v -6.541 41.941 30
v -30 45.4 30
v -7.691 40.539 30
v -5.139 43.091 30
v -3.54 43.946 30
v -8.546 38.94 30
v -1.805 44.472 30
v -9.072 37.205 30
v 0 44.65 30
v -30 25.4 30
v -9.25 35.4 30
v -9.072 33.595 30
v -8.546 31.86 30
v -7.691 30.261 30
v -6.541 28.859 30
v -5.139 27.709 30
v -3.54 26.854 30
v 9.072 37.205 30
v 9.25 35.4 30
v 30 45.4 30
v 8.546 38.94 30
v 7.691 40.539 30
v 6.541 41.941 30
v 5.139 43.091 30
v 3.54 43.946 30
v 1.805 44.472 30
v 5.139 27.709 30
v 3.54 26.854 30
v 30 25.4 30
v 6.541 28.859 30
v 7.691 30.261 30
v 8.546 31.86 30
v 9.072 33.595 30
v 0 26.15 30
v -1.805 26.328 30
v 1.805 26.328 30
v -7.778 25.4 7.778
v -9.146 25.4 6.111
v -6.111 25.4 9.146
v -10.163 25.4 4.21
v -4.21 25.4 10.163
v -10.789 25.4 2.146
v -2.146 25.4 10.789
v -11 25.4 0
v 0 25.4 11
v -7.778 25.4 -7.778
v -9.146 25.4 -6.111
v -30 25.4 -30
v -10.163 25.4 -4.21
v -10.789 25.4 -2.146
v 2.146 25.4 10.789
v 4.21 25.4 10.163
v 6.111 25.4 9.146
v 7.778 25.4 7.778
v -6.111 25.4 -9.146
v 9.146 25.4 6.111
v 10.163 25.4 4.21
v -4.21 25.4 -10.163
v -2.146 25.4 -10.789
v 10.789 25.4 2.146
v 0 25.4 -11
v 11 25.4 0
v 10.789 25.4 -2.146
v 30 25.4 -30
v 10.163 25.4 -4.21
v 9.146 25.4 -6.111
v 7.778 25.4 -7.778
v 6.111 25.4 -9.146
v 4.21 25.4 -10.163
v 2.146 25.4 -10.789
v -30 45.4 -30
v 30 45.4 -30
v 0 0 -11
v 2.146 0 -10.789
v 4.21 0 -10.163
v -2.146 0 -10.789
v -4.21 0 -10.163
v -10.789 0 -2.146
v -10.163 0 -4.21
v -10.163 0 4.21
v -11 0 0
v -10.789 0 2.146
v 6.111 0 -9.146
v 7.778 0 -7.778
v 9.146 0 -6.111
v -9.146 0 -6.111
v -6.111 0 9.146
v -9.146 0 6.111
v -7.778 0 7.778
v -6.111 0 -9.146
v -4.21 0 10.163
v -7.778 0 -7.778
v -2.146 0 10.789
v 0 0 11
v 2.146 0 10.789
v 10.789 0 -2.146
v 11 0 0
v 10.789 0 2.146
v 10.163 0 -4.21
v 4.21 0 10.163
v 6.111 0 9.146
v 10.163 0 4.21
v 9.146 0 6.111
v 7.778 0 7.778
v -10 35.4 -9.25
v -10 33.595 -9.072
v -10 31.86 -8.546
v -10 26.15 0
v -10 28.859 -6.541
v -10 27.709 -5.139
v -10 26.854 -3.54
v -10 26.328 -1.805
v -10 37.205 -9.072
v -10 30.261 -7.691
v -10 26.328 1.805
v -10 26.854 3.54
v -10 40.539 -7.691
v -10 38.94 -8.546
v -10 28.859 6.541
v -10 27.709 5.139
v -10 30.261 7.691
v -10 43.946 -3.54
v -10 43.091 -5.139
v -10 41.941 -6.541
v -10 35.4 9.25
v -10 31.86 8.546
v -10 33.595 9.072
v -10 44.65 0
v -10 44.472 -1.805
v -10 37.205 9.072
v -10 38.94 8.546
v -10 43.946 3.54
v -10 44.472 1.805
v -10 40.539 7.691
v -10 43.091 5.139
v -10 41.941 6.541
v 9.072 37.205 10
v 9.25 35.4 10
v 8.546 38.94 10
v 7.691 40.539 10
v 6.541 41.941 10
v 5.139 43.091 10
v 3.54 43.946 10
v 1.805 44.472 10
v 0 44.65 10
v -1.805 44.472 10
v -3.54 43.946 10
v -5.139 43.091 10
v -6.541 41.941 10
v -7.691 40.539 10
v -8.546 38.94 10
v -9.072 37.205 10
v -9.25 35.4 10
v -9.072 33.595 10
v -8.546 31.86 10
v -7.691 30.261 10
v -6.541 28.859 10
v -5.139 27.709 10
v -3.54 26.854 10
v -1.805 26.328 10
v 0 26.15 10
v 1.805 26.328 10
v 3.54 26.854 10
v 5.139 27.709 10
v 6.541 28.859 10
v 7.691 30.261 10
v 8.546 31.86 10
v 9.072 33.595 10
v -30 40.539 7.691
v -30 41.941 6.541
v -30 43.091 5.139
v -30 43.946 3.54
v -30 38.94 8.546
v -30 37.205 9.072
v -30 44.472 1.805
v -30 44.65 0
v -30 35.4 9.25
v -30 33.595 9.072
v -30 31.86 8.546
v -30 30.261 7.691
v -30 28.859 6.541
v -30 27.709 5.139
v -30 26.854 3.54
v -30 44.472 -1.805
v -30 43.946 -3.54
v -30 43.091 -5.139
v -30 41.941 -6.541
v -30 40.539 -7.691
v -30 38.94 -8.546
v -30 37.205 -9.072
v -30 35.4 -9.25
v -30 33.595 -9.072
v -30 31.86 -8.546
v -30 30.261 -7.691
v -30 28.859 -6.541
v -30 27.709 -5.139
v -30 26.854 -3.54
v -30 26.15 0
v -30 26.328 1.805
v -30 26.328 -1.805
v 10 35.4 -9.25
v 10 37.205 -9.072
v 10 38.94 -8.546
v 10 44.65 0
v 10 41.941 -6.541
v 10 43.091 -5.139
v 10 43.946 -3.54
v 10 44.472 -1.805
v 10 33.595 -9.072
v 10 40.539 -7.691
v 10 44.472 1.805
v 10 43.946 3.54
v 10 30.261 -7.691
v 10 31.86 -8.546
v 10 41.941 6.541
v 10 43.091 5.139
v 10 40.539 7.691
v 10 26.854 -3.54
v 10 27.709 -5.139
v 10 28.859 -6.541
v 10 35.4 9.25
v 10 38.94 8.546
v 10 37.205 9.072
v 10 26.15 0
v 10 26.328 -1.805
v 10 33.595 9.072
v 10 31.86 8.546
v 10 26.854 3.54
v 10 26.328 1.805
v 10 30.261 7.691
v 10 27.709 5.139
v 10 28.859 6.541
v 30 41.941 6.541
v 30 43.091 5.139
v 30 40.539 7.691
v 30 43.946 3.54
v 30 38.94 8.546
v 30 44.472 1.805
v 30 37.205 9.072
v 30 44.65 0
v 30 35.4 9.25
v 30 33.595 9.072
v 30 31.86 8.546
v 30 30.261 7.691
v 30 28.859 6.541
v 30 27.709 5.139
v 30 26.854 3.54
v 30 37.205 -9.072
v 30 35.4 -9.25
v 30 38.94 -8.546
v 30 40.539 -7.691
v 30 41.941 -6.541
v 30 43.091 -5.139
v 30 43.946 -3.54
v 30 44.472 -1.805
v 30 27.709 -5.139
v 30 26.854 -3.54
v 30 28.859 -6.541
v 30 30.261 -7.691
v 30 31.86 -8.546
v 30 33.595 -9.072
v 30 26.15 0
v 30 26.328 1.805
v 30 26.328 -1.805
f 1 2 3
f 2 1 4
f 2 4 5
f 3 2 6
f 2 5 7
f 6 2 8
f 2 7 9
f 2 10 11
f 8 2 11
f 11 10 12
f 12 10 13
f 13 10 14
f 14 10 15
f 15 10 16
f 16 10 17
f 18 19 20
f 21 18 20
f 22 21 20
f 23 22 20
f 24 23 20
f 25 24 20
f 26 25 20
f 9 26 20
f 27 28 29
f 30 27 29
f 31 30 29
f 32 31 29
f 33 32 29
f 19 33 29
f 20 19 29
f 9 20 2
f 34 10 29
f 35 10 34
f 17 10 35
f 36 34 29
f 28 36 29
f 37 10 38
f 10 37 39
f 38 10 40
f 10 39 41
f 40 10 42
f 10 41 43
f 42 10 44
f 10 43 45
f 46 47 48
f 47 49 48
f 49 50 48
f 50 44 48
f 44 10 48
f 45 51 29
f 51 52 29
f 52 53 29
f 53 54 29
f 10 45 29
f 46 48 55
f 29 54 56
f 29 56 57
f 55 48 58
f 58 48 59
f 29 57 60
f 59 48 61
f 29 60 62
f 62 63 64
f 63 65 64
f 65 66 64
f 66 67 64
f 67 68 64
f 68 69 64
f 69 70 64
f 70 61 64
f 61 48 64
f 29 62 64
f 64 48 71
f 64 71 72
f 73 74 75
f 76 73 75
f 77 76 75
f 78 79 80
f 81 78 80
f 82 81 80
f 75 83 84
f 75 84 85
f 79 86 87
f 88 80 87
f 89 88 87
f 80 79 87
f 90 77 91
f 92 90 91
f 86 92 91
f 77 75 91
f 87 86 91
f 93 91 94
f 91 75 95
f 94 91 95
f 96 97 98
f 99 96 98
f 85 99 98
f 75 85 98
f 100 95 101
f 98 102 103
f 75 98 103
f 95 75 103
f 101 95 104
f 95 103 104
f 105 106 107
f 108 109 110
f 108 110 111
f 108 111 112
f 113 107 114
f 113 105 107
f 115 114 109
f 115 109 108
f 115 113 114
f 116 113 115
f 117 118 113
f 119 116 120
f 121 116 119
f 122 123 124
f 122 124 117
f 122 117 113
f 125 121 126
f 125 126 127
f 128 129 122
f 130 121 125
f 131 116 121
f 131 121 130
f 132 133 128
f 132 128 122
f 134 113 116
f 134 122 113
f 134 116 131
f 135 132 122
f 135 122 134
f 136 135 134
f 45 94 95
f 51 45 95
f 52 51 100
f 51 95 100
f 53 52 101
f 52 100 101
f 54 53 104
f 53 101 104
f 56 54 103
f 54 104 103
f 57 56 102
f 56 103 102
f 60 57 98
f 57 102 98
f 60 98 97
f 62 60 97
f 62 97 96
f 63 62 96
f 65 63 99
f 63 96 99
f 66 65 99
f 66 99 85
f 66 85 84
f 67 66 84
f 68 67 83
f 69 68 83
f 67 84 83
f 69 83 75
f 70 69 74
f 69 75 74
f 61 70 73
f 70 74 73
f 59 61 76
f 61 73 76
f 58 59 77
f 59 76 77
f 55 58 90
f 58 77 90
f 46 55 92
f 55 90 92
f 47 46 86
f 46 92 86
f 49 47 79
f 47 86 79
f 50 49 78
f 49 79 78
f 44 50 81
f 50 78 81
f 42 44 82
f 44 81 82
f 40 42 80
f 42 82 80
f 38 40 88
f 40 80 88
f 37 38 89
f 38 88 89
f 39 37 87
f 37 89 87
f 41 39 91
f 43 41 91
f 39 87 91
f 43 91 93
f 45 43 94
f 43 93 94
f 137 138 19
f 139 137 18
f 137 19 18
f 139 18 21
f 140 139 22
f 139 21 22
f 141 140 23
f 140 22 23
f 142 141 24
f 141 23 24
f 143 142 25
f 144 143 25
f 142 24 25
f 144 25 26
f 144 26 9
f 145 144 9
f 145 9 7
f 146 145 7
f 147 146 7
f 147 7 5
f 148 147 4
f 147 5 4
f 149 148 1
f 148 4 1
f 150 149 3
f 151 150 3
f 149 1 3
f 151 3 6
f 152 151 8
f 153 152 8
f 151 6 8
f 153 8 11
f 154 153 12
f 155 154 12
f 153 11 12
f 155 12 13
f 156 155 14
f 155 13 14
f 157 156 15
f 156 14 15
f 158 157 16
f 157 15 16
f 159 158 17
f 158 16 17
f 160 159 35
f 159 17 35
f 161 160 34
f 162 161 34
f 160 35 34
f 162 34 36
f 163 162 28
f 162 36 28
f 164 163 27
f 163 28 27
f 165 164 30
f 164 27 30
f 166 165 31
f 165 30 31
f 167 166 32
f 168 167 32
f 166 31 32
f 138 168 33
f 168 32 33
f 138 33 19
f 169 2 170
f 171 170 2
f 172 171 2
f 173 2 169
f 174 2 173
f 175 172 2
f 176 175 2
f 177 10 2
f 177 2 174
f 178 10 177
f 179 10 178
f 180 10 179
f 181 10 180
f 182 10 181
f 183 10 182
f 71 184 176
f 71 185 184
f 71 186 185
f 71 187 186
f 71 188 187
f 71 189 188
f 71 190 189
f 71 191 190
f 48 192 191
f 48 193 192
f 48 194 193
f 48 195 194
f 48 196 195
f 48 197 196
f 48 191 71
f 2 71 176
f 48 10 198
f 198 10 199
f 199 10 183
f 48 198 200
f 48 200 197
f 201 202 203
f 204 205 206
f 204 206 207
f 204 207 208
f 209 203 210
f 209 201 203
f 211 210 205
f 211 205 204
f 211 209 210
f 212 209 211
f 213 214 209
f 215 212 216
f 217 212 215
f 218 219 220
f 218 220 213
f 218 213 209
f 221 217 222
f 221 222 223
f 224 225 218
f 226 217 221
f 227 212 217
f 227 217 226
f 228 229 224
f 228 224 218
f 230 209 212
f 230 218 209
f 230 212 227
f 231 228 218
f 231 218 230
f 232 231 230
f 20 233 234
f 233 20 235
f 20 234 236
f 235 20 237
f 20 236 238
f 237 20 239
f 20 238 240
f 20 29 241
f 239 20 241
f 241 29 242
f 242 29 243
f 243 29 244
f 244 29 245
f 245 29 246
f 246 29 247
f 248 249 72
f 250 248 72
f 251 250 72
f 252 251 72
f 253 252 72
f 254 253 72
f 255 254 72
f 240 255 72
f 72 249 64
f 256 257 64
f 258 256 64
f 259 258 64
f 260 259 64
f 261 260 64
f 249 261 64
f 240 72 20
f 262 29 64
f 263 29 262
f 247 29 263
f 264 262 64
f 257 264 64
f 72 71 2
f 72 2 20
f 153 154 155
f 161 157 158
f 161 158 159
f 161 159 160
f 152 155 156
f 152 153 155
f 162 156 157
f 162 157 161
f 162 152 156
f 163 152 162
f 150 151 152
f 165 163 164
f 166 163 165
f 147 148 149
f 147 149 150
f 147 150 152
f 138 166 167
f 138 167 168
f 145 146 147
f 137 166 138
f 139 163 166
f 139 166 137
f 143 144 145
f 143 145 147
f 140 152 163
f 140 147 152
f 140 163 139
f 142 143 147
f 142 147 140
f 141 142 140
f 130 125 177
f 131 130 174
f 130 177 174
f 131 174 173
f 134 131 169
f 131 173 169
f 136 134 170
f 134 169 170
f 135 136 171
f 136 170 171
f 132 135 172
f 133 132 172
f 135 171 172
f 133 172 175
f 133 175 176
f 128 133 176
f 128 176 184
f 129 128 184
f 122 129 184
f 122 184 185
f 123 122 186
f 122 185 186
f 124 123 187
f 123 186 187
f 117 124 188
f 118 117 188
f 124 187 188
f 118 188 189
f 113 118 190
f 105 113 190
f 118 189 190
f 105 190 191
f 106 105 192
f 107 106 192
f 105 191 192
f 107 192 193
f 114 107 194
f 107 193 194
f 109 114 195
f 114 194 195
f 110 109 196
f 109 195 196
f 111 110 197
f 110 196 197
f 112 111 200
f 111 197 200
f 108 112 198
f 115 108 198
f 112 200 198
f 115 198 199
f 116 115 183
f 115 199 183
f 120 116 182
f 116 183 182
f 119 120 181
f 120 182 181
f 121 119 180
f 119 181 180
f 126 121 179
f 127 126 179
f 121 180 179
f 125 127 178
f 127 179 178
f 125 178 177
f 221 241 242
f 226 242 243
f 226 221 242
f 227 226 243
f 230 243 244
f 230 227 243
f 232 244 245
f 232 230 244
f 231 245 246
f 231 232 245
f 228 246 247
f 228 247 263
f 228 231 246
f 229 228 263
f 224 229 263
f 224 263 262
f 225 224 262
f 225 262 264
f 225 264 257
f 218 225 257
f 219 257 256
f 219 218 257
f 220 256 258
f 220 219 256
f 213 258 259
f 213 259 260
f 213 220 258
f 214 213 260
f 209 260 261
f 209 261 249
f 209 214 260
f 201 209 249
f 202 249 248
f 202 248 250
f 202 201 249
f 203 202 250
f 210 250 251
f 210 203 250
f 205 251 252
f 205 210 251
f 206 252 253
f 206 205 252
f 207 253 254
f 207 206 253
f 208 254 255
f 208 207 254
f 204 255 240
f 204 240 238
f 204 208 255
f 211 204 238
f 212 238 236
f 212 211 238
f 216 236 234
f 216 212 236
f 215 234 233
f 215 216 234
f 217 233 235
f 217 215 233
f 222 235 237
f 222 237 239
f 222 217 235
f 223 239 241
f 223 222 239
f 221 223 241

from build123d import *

# Parameters (mm, degrees)
SKETCH1_R           = 11
BOSS_EXTRUDE1_DEPTH = 25.4
SKETCH13_W          = 60
SKETCH13_H          = 60
BOSS_EXTRUDE5_DEPTH = 20
FACE_1_R            = 9.25
CUT_EXTRUDE1_DEPTH  = 20
FACE_3_R            = 9.25
CUT_EXTRUDE2_DEPTH  = 20
CUT_EXTRUDE3_START  = -20
FACE_2_R            = 9.25
CUT_EXTRUDE3_DEPTH  = 20


with BuildPart() as part:
    # Sketch1 → Boss-Extrude1 (new body)
    with BuildSketch(Plane(origin=(0, 0, 0), x_dir=(1, 0, 0), z_dir=(0, 1, 0))):
        with Locations(Location((0, 0, 0), (0, 0, 270))):
            Circle(SKETCH1_R)
    extrude(amount=BOSS_EXTRUDE1_DEPTH)

    # Sketch13 → Boss-Extrude5 (add)
    with BuildSketch(Plane(origin=(0, 25.4, 0), x_dir=(1, 0, 0), z_dir=(0, 1, 0))):
        Rectangle(SKETCH13_W, SKETCH13_H)
    extrude(amount=BOSS_EXTRUDE5_DEPTH)

    # Face 1 → Cut-Extrude1 (cut)
    with BuildSketch(Plane.XY.offset(30)):
        with Locations((0, 35.4)):
            Circle(FACE_1_R)
    extrude(amount=-CUT_EXTRUDE1_DEPTH, mode=Mode.SUBTRACT)

    # Face 3 → Cut-Extrude2 (cut)
    with BuildSketch(Plane.ZY.offset(30)):
        with Locations((0, 35.4)):
            Circle(FACE_3_R)
    extrude(amount=-CUT_EXTRUDE2_DEPTH, mode=Mode.SUBTRACT)

    # Face 2 → Cut-Extrude3 (cut)
    with BuildSketch(Plane(origin=(30, 0, 0), x_dir=(0, 0, -1), z_dir=(1, 0, 0)).offset(CUT_EXTRUDE3_START)):
        with Locations(Location((0, 35.4, 0), (0, 0, 180))):
            Circle(FACE_2_R)
    extrude(amount=CUT_EXTRUDE3_DEPTH, mode=Mode.SUBTRACT)


solid = part.part
